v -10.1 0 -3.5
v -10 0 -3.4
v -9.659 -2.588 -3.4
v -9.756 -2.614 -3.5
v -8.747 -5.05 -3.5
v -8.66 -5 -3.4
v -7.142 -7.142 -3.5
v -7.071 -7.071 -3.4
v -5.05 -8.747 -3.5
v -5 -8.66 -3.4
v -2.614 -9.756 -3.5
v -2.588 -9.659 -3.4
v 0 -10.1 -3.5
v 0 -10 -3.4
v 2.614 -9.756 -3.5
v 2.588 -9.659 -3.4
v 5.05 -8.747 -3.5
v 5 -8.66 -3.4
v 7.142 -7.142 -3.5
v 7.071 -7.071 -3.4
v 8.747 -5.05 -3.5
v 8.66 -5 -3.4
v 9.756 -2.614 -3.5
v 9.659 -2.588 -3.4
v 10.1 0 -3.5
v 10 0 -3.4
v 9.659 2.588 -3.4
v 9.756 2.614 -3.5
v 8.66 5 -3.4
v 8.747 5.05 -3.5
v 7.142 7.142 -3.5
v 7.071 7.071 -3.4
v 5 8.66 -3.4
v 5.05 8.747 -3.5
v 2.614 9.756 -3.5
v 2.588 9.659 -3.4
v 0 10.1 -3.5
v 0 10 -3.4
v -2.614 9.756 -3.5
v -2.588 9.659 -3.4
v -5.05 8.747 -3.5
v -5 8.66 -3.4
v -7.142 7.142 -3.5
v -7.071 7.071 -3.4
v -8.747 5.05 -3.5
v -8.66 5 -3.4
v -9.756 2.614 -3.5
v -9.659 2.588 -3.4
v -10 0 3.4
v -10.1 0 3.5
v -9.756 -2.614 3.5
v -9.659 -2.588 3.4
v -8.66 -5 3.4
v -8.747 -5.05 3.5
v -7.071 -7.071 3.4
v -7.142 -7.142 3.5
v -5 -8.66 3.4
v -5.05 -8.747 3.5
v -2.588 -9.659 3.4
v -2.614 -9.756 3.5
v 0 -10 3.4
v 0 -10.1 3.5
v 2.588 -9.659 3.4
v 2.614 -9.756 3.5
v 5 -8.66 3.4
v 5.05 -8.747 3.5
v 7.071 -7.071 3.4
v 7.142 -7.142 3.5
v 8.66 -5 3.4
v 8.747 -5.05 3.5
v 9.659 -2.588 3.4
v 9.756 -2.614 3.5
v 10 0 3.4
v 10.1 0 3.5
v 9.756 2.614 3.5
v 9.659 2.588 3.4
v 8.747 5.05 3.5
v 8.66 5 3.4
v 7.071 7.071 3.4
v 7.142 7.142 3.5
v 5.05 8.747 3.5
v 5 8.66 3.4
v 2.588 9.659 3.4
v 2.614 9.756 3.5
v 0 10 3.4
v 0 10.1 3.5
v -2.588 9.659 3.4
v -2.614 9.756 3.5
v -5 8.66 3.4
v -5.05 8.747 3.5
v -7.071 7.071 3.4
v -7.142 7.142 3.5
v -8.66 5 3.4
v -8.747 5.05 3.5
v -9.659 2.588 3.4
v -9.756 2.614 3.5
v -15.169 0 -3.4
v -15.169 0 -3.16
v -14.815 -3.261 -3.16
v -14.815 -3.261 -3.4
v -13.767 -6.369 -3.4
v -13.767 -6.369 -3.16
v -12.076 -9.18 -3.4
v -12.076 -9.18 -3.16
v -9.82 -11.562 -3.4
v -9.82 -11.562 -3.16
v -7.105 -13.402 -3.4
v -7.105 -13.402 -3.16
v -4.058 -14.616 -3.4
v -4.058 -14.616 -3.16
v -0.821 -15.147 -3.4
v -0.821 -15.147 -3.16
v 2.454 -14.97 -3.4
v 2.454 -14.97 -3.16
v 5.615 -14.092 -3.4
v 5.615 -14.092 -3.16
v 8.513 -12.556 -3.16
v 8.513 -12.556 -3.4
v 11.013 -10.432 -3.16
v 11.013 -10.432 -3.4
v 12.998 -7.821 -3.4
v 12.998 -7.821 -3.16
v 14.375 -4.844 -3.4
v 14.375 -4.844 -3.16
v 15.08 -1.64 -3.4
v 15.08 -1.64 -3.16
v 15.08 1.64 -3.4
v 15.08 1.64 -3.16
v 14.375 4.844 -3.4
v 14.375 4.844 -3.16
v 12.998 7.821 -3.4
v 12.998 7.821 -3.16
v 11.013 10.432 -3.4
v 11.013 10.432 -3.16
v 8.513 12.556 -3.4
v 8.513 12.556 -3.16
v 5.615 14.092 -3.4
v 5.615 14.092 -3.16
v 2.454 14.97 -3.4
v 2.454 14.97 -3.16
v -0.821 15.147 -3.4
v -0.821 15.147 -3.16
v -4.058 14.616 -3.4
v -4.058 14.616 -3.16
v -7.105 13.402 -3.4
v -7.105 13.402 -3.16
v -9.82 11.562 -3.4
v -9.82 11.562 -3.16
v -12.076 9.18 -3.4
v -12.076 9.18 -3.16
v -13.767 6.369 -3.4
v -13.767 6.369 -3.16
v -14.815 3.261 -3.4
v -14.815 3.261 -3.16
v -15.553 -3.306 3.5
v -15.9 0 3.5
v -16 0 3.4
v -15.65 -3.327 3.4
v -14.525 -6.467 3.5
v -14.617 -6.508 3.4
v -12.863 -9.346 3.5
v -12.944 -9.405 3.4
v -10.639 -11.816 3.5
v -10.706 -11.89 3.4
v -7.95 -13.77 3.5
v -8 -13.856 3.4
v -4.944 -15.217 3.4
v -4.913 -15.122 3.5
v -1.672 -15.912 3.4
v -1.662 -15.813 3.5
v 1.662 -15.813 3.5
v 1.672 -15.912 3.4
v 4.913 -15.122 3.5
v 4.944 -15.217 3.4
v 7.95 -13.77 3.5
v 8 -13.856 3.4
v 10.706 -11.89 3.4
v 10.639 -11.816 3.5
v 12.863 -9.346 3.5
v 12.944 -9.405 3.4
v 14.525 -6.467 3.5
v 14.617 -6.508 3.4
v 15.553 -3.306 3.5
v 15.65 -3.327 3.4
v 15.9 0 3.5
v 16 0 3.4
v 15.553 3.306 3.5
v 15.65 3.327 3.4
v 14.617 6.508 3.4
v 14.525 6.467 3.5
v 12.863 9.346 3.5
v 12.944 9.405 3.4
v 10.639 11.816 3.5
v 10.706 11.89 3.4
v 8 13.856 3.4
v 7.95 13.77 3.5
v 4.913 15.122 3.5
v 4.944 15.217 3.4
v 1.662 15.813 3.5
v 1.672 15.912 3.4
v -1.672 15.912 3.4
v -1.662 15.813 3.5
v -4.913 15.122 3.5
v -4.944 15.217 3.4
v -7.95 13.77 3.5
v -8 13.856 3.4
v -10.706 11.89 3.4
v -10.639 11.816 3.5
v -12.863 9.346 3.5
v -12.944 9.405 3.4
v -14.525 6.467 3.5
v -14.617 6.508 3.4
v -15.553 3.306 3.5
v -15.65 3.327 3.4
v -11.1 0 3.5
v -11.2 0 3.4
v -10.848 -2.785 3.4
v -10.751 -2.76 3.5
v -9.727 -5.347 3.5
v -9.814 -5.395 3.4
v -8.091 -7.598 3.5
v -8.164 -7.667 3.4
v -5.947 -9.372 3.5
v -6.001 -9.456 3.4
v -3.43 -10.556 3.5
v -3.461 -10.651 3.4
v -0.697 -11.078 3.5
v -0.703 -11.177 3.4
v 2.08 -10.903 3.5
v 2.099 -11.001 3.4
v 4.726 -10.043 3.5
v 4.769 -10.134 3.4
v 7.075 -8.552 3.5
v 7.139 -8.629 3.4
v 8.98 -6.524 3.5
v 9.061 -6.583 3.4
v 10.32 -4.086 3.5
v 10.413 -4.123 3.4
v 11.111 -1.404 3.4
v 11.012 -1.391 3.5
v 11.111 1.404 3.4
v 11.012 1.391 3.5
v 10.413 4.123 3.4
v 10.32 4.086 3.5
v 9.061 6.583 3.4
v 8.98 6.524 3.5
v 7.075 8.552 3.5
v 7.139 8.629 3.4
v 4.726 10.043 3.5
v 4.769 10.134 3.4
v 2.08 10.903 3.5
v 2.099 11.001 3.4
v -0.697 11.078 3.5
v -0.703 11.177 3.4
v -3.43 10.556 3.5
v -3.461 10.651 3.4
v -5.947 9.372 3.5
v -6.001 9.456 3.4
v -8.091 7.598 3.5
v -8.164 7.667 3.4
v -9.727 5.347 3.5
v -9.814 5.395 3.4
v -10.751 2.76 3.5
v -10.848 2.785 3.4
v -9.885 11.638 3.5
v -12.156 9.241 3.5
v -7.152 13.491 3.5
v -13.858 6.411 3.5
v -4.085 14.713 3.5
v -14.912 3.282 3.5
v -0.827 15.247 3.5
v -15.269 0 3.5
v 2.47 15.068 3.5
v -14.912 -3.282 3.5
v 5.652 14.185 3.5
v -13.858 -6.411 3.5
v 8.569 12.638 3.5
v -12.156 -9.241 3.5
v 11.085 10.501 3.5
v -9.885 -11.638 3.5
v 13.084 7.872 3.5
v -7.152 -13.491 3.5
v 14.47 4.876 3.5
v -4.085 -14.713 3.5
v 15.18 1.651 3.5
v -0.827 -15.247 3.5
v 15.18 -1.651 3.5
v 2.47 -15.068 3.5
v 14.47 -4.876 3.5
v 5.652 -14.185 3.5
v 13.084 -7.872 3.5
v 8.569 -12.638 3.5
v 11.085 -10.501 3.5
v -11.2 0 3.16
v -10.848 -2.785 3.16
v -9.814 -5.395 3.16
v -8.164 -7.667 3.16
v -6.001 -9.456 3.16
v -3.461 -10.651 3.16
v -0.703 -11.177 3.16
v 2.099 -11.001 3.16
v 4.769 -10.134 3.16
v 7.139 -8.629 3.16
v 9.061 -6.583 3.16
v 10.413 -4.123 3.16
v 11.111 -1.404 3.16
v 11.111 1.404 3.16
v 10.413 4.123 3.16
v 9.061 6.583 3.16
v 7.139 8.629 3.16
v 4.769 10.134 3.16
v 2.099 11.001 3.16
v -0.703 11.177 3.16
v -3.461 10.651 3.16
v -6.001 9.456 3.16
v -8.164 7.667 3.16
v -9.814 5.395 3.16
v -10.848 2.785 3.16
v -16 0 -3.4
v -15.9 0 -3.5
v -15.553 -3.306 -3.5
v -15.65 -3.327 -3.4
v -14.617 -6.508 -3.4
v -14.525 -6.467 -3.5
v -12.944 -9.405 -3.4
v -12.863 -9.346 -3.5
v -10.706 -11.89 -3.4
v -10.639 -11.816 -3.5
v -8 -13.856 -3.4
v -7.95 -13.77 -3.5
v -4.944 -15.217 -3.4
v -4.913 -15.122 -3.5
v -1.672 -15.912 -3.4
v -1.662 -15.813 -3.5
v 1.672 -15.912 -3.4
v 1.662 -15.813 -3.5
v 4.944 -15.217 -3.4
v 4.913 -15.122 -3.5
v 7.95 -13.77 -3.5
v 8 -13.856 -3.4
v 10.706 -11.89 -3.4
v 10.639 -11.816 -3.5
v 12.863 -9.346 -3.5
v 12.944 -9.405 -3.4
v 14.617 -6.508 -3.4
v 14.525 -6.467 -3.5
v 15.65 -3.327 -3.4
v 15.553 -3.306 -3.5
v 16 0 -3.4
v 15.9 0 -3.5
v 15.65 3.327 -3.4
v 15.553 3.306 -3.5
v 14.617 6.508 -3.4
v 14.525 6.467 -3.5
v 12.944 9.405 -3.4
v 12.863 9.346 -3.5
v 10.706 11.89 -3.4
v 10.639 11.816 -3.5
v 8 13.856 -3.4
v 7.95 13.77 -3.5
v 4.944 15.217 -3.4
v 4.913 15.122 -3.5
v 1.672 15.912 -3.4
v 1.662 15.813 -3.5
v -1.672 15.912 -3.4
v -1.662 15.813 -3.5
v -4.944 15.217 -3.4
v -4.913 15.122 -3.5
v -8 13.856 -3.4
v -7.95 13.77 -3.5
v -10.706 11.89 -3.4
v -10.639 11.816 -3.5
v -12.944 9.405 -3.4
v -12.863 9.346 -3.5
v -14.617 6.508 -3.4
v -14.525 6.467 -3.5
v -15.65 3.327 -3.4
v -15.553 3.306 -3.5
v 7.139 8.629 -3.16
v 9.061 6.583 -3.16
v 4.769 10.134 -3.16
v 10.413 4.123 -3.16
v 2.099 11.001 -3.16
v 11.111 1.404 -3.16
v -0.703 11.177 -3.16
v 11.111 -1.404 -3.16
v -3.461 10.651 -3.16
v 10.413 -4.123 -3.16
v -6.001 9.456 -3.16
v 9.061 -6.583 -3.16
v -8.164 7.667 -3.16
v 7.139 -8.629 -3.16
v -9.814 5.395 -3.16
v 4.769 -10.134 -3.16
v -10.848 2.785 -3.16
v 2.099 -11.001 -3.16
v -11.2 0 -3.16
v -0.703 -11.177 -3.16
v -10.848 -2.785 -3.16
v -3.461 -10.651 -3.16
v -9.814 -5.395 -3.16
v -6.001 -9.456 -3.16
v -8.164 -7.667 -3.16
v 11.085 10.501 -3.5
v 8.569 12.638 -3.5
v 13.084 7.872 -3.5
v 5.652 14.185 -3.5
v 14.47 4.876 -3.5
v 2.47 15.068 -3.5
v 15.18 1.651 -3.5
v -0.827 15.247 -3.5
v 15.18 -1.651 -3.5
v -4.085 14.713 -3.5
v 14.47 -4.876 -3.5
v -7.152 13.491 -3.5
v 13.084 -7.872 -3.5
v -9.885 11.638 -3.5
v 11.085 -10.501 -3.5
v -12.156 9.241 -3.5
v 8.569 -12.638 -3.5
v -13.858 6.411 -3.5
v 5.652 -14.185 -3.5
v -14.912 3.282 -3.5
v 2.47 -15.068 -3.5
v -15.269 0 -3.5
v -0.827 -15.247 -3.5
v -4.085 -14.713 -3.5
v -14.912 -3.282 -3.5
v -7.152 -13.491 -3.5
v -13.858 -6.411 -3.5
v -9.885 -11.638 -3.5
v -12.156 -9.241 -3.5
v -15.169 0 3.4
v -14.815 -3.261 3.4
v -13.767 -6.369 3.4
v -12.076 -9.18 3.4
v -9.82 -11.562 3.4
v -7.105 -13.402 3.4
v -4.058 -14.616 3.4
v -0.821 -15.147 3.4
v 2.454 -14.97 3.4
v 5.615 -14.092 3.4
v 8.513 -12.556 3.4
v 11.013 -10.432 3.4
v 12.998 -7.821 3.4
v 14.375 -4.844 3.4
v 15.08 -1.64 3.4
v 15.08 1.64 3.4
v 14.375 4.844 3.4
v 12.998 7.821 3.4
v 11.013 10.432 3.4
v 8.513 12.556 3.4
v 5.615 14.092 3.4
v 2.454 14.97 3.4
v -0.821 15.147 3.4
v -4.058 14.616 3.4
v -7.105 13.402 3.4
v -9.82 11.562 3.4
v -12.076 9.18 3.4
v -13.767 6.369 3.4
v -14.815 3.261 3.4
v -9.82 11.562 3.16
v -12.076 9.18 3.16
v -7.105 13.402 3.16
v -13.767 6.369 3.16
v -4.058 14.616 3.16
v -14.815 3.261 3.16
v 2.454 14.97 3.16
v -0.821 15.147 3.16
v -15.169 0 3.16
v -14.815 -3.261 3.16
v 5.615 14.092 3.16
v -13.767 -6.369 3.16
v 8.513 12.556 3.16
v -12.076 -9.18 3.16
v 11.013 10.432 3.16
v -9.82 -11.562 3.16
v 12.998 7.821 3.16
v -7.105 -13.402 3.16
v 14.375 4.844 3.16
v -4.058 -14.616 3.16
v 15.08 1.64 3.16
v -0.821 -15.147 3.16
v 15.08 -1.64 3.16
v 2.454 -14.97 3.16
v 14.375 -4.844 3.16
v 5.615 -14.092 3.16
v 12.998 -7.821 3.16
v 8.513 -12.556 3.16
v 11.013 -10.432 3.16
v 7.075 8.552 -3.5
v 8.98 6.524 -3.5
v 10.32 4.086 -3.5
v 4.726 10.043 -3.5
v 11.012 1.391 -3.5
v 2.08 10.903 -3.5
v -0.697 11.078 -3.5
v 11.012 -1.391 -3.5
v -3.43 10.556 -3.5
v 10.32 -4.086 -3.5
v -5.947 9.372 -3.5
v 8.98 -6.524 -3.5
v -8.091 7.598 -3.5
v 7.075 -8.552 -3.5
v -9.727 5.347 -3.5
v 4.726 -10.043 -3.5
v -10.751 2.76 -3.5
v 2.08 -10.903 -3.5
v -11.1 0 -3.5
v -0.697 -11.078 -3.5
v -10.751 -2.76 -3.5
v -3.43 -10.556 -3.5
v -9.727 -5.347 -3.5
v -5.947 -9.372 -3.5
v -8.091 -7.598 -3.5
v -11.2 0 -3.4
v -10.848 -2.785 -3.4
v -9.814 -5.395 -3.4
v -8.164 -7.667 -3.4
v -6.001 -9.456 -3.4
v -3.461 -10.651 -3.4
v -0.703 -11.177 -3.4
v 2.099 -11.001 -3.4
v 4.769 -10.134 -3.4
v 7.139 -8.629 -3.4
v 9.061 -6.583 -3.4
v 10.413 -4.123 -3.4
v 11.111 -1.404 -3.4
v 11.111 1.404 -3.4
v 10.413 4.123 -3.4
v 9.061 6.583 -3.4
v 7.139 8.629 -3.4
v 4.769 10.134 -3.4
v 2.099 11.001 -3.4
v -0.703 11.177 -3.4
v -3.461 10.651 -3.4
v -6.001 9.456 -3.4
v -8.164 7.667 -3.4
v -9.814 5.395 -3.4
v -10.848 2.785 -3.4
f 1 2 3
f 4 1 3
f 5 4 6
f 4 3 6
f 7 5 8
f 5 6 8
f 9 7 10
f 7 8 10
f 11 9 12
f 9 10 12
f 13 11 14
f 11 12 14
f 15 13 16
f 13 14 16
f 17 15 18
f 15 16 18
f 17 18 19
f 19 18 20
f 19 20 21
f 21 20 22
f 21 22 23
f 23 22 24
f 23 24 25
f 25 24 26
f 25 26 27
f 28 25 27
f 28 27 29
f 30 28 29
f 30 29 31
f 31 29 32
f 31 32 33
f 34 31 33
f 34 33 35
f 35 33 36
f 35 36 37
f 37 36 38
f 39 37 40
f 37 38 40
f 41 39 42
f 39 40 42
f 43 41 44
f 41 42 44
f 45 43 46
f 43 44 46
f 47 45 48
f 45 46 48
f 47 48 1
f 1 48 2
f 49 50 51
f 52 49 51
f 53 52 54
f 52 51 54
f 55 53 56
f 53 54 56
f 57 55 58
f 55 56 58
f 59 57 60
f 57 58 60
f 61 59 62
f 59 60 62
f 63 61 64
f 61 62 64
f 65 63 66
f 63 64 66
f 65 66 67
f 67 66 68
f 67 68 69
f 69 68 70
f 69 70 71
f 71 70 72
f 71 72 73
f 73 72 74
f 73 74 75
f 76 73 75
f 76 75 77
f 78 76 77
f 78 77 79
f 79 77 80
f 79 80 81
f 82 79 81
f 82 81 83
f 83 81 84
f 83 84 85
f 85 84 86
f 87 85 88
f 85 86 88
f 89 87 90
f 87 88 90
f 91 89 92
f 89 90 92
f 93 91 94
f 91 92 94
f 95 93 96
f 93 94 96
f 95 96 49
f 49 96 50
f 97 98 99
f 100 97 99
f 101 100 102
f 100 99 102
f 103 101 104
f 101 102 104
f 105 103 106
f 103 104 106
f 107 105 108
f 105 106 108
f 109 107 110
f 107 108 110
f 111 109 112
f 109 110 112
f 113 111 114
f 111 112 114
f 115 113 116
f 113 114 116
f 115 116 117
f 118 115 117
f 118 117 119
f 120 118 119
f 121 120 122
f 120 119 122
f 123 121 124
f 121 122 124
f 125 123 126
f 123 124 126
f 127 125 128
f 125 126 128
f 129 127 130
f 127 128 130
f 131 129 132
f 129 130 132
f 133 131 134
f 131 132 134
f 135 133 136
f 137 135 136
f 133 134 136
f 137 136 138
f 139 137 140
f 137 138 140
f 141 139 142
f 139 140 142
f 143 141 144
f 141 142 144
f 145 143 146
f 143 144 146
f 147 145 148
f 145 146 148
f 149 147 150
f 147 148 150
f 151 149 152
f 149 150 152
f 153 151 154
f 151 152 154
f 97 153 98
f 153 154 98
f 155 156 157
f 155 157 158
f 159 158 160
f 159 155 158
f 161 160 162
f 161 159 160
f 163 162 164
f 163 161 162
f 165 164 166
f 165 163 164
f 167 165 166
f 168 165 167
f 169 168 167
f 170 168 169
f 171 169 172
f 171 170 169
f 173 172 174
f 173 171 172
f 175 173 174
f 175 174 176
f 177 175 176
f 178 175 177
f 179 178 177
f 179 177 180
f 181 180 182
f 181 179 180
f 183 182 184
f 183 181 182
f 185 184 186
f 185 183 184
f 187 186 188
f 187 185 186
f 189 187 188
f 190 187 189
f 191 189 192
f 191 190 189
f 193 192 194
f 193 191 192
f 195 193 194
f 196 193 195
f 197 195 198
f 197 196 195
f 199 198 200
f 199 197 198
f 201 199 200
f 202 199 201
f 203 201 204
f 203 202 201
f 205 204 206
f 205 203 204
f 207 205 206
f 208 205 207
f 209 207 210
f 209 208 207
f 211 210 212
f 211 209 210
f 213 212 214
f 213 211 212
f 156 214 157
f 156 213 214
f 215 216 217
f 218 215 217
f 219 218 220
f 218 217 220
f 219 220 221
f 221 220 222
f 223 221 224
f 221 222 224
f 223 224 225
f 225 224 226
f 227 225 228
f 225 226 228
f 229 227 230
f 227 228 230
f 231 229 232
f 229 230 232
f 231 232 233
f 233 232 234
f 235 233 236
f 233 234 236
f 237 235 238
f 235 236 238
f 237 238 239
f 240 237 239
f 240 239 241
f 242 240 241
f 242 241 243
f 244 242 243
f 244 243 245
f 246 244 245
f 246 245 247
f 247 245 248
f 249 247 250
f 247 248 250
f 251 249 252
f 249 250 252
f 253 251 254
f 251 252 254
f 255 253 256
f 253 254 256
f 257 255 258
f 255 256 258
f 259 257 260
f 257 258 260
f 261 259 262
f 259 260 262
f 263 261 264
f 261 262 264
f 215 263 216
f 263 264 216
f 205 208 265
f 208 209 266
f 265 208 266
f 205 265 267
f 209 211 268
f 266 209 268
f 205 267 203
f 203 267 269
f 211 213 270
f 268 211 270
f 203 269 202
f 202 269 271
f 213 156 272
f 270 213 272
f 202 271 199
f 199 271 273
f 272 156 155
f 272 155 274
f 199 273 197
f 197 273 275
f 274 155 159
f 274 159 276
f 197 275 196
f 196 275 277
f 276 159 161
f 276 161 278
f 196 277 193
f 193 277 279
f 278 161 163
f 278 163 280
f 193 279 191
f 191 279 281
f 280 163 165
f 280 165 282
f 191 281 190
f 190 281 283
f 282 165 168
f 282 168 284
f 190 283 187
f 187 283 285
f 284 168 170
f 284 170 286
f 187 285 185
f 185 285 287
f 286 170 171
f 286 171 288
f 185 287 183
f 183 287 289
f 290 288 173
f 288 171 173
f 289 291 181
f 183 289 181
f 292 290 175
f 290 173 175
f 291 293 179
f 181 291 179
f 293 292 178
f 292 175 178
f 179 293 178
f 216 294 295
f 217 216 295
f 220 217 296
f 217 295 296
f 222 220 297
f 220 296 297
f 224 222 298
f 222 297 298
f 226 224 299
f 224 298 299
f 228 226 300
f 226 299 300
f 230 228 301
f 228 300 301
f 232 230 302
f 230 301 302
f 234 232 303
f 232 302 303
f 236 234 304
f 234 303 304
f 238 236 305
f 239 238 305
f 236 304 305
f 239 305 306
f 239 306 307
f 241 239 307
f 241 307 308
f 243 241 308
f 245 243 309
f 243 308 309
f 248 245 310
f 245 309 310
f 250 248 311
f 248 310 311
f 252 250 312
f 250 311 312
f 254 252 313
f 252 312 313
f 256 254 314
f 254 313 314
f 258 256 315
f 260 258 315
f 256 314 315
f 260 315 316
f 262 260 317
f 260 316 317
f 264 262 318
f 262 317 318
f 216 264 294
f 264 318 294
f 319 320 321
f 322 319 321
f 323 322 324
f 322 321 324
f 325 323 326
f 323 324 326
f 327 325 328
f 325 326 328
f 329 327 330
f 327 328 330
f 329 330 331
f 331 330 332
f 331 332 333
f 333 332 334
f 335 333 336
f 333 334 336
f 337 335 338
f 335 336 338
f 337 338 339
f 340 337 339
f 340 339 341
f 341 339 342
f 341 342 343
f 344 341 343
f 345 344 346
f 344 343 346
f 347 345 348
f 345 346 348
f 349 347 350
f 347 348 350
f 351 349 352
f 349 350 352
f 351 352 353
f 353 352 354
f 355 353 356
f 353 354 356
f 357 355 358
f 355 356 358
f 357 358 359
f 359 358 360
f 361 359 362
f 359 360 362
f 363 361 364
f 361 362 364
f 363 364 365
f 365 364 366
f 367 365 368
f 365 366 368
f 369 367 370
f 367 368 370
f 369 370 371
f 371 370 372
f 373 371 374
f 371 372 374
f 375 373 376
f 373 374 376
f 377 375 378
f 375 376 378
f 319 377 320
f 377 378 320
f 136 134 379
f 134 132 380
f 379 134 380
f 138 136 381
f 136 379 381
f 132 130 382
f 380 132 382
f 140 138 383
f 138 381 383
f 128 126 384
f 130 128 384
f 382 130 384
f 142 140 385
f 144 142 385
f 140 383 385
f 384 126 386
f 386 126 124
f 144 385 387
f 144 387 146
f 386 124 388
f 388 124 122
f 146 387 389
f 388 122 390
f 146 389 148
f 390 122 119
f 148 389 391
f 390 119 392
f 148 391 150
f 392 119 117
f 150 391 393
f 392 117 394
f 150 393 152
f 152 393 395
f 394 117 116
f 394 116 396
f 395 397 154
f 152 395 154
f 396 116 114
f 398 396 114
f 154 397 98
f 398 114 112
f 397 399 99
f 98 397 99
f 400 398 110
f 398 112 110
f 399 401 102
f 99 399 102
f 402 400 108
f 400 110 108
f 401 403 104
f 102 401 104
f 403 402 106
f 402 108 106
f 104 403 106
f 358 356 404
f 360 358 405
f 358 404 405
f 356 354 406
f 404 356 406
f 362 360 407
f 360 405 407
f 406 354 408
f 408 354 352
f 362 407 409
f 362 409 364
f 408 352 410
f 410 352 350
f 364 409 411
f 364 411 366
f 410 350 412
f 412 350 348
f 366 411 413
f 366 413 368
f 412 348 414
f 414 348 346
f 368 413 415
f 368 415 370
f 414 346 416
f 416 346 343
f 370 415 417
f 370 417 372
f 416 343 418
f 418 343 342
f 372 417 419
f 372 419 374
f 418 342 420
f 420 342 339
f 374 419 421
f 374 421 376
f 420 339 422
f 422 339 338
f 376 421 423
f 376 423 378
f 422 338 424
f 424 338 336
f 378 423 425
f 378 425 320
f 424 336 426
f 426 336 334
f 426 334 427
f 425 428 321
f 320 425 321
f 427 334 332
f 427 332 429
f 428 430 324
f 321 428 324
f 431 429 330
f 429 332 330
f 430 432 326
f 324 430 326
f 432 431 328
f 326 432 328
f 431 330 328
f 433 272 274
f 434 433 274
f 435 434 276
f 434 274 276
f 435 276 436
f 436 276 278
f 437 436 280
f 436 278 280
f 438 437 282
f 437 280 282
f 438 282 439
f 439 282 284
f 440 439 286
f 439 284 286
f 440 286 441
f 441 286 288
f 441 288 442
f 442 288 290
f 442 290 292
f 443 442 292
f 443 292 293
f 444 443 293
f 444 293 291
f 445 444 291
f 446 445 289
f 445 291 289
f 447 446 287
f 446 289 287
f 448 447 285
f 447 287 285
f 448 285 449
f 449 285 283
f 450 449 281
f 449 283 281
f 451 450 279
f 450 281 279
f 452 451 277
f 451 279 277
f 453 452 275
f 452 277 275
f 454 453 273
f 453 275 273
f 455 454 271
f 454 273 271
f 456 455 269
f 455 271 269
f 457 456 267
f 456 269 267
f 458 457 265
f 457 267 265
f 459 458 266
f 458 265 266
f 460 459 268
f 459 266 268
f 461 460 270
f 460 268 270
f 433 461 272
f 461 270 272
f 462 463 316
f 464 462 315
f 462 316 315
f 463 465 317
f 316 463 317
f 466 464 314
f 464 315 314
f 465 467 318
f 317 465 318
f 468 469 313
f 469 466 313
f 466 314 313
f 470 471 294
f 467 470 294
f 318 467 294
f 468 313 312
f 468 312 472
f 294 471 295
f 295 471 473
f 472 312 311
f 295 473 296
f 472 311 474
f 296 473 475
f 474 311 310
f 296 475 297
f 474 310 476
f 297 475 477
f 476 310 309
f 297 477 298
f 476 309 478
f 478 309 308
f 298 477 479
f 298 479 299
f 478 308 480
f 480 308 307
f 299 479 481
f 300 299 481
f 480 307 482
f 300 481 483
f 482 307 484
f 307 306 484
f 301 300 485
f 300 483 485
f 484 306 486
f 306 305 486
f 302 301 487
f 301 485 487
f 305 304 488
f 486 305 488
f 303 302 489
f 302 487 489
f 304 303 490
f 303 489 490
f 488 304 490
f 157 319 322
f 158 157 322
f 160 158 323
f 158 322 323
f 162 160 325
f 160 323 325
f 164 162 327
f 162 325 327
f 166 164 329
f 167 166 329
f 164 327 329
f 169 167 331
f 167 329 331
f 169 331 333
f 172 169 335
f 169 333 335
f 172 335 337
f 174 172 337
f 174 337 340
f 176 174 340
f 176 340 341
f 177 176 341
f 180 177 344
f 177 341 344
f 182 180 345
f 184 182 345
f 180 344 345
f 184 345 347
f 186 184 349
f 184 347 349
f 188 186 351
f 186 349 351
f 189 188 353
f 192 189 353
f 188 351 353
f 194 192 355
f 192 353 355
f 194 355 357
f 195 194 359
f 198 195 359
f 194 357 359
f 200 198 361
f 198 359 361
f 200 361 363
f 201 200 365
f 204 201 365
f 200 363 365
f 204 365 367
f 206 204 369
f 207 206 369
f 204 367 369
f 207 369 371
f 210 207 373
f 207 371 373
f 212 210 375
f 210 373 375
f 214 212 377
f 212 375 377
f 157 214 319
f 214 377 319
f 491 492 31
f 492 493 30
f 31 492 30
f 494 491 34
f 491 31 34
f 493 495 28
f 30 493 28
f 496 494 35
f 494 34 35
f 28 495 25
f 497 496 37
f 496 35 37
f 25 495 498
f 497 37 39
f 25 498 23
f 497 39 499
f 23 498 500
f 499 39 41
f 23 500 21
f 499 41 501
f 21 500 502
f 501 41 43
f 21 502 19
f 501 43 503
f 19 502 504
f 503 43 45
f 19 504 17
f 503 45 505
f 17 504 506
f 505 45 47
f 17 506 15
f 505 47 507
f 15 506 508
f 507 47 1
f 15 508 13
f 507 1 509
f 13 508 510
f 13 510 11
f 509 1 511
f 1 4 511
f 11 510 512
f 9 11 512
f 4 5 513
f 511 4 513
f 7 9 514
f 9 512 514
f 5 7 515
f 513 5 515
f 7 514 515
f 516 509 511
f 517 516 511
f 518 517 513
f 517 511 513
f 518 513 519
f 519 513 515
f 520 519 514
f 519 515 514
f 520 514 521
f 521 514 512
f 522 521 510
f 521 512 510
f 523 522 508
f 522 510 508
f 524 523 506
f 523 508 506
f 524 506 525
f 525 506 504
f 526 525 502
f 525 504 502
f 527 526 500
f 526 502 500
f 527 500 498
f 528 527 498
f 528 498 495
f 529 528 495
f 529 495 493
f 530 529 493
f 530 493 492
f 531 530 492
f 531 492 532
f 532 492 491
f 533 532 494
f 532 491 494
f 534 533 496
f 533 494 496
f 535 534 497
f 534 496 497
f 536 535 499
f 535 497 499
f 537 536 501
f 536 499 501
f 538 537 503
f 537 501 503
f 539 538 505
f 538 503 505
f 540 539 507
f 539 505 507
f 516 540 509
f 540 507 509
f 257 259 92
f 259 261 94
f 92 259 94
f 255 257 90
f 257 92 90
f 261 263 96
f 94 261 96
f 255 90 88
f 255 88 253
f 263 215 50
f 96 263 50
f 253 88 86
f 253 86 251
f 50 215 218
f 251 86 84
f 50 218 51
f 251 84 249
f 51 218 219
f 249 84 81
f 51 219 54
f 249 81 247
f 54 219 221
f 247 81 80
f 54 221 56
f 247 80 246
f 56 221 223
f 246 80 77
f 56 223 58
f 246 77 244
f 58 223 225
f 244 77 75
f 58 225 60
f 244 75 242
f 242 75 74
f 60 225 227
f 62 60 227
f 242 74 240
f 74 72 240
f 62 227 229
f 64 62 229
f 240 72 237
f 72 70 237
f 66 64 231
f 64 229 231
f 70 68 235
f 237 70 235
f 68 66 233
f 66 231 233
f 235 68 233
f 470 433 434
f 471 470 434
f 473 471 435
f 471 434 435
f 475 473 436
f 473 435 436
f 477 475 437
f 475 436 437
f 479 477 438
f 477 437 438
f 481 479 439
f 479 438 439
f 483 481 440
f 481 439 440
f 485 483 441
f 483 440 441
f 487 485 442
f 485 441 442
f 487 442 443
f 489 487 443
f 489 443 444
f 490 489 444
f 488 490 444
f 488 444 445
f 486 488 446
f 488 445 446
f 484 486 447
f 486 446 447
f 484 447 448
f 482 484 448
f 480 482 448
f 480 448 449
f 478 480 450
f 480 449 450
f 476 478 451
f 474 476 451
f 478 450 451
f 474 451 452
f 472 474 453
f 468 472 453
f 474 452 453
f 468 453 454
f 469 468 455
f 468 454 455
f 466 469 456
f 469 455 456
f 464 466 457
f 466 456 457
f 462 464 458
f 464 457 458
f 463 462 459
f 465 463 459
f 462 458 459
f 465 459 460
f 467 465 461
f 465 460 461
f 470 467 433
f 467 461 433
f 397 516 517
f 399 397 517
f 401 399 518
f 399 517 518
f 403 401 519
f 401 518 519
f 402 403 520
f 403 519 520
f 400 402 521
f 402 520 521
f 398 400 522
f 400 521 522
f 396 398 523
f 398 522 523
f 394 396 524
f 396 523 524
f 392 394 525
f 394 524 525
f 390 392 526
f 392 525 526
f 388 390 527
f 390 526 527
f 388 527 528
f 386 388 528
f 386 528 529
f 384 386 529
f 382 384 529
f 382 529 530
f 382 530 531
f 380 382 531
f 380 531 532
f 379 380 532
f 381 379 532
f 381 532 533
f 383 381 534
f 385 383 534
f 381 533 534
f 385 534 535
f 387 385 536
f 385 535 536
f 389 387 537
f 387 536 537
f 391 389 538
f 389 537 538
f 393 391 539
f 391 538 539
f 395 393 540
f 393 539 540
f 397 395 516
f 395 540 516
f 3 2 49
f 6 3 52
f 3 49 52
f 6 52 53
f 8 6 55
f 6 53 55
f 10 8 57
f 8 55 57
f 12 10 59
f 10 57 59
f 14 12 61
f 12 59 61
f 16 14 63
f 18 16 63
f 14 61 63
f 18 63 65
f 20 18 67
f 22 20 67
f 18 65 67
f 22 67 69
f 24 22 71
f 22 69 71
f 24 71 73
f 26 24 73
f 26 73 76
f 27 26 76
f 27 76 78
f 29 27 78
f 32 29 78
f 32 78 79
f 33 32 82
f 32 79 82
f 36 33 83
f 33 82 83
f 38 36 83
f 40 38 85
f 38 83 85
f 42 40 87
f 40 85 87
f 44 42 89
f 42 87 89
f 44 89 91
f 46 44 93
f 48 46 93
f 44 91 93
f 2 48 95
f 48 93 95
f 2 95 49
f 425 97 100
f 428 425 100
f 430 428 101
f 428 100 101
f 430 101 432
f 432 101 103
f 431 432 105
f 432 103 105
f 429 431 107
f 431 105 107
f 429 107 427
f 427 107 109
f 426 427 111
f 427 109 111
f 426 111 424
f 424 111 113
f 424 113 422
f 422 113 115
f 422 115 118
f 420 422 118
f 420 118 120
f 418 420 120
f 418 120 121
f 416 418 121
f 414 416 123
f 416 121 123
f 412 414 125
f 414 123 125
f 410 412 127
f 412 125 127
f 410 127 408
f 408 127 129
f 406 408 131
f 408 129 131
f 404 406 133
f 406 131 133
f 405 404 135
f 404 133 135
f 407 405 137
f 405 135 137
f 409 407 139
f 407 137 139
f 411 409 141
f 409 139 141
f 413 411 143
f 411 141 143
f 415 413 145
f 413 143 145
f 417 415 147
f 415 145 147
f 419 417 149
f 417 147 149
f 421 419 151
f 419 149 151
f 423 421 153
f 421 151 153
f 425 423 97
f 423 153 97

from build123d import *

# Parameters (mm, degrees)
CHAMFER1_SIZE = 0.1


with BuildPart() as part:
    # Sketch1 → Revolve1 (revolve)
    with BuildSketch(Plane(origin=(0, 0, 0), x_dir=(0, 0, -1), z_dir=(1, 0, 0)), mode=Mode.PRIVATE) as revolve1_sk:
        Polygon((-3.5, 16), (3.5, 16), (3.5, 15.169361198), (3.160325371, 15.169361198), (3.160325371, 11.199592719), (3.5, 11.199592719), (3.5, 10), (-3.5, 10), (-3.5, 11.199592719), (-3.160325371, 11.199592719), (-3.160325371, 15.169361198), (-3.5, 15.169361198), align=None)
    revolve(revolve1_sk.sketch.rotate(Axis((0, 0, -19.078271996), (0, 0, 1)), 90), axis=Axis((0, 0, -19.078271996), (0, 0, 1)))

    # Chamfer1
    chamfer1_edges = [part.edges().sort_by_distance(p)[0] for p in [
        (15.169361198, 0, 3.5),
        (16, 0, 3.5),
        (16, 0, -3.5),
        (15.169361198, 0, -3.5),
        (11.199592719, 0, -3.5),
        (10, 0, -3.5),
        (10, 0, 3.5),
        (11.199592719, 0, 3.5),
    ]]
    chamfer(chamfer1_edges, length=CHAMFER1_SIZE)


solid = part.part
